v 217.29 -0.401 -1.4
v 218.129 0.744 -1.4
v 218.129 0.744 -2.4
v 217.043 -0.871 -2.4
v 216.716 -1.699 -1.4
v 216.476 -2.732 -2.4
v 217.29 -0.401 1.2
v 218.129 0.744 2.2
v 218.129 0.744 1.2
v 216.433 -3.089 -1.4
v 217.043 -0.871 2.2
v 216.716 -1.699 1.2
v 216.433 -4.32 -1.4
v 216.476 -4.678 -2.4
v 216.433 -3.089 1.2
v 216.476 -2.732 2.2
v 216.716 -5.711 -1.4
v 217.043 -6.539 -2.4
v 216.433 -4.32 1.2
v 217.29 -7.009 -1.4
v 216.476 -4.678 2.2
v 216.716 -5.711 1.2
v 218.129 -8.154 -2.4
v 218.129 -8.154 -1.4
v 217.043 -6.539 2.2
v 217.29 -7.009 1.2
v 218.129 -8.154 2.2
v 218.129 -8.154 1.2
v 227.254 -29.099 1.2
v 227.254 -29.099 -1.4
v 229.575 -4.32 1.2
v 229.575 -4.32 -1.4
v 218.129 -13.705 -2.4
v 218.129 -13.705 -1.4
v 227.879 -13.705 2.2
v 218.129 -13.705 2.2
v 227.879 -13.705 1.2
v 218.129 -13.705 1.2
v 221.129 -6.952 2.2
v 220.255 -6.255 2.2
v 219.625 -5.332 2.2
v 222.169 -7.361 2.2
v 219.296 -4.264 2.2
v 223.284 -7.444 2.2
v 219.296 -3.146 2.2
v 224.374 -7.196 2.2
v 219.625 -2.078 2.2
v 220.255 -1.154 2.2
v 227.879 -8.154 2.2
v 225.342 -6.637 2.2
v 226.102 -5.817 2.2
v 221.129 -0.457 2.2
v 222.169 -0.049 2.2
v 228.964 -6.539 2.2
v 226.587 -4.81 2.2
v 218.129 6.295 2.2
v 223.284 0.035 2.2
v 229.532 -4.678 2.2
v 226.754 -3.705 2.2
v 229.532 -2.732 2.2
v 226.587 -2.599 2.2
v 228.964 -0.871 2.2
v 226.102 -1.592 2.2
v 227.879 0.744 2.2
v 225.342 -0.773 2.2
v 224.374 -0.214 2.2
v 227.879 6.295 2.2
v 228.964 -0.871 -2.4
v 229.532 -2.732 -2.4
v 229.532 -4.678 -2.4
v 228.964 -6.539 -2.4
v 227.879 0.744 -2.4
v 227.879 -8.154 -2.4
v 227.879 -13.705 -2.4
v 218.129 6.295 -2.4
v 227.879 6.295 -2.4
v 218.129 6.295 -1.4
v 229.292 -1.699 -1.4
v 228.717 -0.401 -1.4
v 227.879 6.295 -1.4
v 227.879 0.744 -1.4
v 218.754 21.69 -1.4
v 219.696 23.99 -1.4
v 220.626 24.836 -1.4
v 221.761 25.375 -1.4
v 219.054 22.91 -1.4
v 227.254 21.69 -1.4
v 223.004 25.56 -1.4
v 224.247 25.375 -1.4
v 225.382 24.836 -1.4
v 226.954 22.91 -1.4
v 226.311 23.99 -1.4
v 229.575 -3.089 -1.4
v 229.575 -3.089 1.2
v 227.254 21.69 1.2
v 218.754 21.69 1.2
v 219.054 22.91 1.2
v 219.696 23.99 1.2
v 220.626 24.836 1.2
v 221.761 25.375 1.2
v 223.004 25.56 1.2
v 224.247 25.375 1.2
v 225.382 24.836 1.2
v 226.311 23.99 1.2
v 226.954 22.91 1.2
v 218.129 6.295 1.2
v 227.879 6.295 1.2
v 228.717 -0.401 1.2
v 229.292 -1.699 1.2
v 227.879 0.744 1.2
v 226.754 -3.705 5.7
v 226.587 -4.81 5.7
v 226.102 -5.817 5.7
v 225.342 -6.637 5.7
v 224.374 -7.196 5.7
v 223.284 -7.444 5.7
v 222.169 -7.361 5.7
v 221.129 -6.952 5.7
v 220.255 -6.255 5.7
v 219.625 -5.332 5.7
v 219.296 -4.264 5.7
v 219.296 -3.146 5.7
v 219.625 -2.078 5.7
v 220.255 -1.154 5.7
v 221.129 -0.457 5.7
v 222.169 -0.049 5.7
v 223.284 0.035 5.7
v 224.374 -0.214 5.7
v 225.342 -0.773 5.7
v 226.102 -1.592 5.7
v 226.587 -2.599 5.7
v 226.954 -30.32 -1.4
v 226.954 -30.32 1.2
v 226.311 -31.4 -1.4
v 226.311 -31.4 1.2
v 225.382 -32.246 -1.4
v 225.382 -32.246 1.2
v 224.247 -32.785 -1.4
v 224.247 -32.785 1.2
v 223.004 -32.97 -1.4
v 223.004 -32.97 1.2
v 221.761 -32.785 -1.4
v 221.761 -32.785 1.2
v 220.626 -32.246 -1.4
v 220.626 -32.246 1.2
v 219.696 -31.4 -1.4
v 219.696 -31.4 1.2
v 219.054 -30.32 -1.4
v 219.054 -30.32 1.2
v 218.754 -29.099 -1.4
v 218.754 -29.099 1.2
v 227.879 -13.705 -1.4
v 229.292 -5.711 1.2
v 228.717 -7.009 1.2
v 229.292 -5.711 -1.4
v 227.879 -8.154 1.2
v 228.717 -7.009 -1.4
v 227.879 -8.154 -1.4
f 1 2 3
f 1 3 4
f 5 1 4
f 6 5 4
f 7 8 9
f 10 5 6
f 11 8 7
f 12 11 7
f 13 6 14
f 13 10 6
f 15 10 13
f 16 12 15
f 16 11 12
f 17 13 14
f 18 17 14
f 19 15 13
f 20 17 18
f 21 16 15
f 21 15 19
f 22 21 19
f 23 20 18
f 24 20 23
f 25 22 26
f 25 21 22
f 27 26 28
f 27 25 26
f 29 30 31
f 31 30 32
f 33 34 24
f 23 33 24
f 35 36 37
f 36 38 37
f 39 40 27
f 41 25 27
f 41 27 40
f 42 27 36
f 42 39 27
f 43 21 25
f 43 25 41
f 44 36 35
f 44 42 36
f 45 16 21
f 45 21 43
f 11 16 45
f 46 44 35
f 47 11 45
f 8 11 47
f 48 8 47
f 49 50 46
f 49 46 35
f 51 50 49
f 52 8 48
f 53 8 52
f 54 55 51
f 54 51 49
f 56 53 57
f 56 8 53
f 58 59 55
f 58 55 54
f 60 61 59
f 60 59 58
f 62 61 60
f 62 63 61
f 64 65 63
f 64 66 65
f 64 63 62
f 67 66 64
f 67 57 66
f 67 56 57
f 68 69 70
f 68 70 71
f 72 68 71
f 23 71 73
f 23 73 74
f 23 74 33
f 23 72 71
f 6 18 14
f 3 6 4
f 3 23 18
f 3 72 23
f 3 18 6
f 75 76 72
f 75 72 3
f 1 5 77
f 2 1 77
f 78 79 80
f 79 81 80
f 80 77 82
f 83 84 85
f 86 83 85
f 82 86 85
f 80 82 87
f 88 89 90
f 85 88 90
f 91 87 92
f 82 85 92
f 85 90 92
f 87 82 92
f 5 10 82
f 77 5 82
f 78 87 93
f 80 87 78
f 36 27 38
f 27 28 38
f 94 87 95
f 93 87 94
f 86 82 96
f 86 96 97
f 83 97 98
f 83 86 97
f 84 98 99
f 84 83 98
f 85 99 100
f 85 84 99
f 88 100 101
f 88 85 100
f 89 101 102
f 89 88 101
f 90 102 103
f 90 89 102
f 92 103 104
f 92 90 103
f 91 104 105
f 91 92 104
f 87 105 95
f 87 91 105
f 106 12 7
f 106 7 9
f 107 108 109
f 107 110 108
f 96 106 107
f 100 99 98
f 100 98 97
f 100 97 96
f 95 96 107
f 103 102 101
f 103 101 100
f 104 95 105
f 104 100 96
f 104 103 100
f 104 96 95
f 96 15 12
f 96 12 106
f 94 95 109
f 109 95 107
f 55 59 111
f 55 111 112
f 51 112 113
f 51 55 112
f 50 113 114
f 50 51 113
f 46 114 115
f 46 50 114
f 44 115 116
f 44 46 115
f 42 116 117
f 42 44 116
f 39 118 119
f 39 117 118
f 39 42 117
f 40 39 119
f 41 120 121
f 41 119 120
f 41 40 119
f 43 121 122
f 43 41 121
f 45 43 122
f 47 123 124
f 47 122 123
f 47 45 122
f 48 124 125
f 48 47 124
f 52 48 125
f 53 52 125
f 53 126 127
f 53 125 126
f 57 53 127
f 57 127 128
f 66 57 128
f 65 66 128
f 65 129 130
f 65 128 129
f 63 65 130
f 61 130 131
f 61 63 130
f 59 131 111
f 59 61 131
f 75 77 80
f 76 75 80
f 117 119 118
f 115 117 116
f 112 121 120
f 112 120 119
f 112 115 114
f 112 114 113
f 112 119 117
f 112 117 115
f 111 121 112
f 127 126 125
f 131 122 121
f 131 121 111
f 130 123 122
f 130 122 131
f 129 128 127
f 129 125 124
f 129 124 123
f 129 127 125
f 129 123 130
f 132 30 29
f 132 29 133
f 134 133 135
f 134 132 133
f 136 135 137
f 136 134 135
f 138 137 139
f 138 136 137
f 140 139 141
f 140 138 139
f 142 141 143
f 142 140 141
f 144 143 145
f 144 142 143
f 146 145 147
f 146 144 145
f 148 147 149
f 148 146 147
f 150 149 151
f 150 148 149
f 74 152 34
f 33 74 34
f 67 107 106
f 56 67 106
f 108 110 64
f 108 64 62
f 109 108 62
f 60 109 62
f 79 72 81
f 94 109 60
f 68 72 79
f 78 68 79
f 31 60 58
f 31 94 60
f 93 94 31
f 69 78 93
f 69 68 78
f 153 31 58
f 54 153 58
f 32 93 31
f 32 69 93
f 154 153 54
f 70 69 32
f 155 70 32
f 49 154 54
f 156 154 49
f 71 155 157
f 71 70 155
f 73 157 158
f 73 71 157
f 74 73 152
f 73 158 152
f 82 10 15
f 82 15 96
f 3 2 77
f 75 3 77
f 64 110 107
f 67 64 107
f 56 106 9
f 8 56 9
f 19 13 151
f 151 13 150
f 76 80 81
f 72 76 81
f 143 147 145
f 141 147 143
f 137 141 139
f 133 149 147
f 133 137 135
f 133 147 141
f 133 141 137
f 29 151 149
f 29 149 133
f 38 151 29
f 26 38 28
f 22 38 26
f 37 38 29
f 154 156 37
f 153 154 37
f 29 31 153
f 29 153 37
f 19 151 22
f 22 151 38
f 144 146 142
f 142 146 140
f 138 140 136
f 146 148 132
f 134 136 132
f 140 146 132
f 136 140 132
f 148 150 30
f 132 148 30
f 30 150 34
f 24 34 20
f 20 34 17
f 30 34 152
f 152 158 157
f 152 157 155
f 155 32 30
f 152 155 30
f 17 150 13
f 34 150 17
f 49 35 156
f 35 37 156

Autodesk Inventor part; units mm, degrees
ref_plane "YZ Plane" through (0, 0, 0) normal (1, 0, 0) x (0, 1, 0)
ref_plane "XZ Plane" through (0, 0, 0) normal (0, 1, 0) x (-1, 0, 0)
ref_plane "XY Plane" through (0, 0, 0) normal (0, 0, 1) x (1, 0, 0)
ref_plane "Work Plane1" through (223.0039, -4.7048, -1.4) normal (0, 0, 1) x (1, 0, 0)
sketch "Sketch1" plane through (223.0039, -4.7048, -1.4) normal (0, 0, 1) x (1, 0, 0)
  arc A0 (6.5712, 0.3844) -> (6.5712, 1.6156) centre (0, 1) ccw
  line L0 (-6.5712, 0.3844) -> (-4.25, -24.3945)
  arc A1 (-4.25, -24.3945) -> (4.25, -24.3945) centre (0, -23.9964) ccw
  line L1 (4.25, -24.3945) -> (6.5712, 0.3844)
  line L2 (0, 1) -> (-6.6, 1) construction
  line L3 (-6.5712, 1.6156) -> (-4.25, 26.3945)
  arc A2 (4.25, 26.3945) -> (-4.25, 26.3945) centre (0, 25.9964) ccw
  line L4 (4.25, 26.3945) -> (6.5712, 1.6156)
  arc A3 (-6.5712, 0.3844) -> (6.5712, 0.3844) centre (0, 1) ccw construction
  arc A4 (-6.5712, 1.6156) -> (-6.5712, 0.3844) centre (0, 1) ccw
  arc A5 (6.5712, 1.6156) -> (-6.5712, 1.6156) centre (0, 1) ccw construction
  circle A6 centre (0, 1) radius 2.5 construction
  point P0 (-223.0039, 4.7048)
  point P1 (0, -28.265)
  dimension "d0" = 13.2
  dimension "d1" = 8.5
  dimension "d2" = 30
extrude "Extrusion1" add sketch "Sketch1" along normal blind 2.6
sketch "Sketch2" plane through (223.0039, -4.7048, -1.4) normal (0, 0, -1) x (-1, 0, 0)
  arc A0 (6.5712, 1.6156) -> (-6.5712, 1.6156) centre (0, 1) ccw projected
  arc A1 (-6.5712, 1.6156) -> (-6.5712, 0.3844) centre (0, 1) ccw projected
  arc A2 (-6.5712, 0.3844) -> (6.5712, 0.3844) centre (0, 1) ccw projected
  arc A3 (6.5712, 0.3844) -> (6.5712, 1.6156) centre (0, 1) ccw projected
  line L0 (-4.875, -9) -> (4.875, -9)
  line L1 (4.875, -9) -> (4.875, 11)
  line L2 (4.875, 11) -> (-4.875, 11)
  line L3 (-4.875, 11) -> (-4.875, -9)
  line L4 (-4.875, -9) -> (4.875, 11) construction
  point P0 (4.875, 5.4491)
  point P1 (4.875, -3.4491)
  point P2 (-4.875, -3.4491)
  point P3 (-4.875, 5.4491)
  dimension "d5" = 9.75
  dimension "d6" = 20
extrude "Extrusion2" add sketch "Sketch2" along normal blind 1
ref_plane "Work Plane2" through (223.0039, -4.7048, -0.1) normal (0, 0, 1) x (1, 0, 0)
mirror "Mirror1" about plane through (223.0039, -4.7048, -0.1) normal (0, 0, 1) of "Extrusion2"
sketch "Sketch3" plane through (218.1289, 6.2952, 2.2) normal (0, 0, 1) x (1, 0, 0)
  arc A0 (0, -5.5509) -> (0, -14.4491) centre (4.875, -10) ccw projected
  arc A1 (0, -5.5509) -> (0, -14.4491) centre (4.875, -10) ccw projected
  circle A2 centre (4.875, -10) radius 3.75
  point P0 (-218.1289, -6.2952)
  point P1 (0, -16.5009)
  point P2 (9.75, -16.5009)
  point P3 (9.75, -14.4491)
  point P4 (9.75, -14.4491)
  point P5 (9.75, 1.9491)
  point P6 (9.75, -5.5509)
  dimension "d9" = 7.5
extrude "Extrusion3" add sketch "Sketch3" along normal blind 3.5
properties part number "Servo Horn"
